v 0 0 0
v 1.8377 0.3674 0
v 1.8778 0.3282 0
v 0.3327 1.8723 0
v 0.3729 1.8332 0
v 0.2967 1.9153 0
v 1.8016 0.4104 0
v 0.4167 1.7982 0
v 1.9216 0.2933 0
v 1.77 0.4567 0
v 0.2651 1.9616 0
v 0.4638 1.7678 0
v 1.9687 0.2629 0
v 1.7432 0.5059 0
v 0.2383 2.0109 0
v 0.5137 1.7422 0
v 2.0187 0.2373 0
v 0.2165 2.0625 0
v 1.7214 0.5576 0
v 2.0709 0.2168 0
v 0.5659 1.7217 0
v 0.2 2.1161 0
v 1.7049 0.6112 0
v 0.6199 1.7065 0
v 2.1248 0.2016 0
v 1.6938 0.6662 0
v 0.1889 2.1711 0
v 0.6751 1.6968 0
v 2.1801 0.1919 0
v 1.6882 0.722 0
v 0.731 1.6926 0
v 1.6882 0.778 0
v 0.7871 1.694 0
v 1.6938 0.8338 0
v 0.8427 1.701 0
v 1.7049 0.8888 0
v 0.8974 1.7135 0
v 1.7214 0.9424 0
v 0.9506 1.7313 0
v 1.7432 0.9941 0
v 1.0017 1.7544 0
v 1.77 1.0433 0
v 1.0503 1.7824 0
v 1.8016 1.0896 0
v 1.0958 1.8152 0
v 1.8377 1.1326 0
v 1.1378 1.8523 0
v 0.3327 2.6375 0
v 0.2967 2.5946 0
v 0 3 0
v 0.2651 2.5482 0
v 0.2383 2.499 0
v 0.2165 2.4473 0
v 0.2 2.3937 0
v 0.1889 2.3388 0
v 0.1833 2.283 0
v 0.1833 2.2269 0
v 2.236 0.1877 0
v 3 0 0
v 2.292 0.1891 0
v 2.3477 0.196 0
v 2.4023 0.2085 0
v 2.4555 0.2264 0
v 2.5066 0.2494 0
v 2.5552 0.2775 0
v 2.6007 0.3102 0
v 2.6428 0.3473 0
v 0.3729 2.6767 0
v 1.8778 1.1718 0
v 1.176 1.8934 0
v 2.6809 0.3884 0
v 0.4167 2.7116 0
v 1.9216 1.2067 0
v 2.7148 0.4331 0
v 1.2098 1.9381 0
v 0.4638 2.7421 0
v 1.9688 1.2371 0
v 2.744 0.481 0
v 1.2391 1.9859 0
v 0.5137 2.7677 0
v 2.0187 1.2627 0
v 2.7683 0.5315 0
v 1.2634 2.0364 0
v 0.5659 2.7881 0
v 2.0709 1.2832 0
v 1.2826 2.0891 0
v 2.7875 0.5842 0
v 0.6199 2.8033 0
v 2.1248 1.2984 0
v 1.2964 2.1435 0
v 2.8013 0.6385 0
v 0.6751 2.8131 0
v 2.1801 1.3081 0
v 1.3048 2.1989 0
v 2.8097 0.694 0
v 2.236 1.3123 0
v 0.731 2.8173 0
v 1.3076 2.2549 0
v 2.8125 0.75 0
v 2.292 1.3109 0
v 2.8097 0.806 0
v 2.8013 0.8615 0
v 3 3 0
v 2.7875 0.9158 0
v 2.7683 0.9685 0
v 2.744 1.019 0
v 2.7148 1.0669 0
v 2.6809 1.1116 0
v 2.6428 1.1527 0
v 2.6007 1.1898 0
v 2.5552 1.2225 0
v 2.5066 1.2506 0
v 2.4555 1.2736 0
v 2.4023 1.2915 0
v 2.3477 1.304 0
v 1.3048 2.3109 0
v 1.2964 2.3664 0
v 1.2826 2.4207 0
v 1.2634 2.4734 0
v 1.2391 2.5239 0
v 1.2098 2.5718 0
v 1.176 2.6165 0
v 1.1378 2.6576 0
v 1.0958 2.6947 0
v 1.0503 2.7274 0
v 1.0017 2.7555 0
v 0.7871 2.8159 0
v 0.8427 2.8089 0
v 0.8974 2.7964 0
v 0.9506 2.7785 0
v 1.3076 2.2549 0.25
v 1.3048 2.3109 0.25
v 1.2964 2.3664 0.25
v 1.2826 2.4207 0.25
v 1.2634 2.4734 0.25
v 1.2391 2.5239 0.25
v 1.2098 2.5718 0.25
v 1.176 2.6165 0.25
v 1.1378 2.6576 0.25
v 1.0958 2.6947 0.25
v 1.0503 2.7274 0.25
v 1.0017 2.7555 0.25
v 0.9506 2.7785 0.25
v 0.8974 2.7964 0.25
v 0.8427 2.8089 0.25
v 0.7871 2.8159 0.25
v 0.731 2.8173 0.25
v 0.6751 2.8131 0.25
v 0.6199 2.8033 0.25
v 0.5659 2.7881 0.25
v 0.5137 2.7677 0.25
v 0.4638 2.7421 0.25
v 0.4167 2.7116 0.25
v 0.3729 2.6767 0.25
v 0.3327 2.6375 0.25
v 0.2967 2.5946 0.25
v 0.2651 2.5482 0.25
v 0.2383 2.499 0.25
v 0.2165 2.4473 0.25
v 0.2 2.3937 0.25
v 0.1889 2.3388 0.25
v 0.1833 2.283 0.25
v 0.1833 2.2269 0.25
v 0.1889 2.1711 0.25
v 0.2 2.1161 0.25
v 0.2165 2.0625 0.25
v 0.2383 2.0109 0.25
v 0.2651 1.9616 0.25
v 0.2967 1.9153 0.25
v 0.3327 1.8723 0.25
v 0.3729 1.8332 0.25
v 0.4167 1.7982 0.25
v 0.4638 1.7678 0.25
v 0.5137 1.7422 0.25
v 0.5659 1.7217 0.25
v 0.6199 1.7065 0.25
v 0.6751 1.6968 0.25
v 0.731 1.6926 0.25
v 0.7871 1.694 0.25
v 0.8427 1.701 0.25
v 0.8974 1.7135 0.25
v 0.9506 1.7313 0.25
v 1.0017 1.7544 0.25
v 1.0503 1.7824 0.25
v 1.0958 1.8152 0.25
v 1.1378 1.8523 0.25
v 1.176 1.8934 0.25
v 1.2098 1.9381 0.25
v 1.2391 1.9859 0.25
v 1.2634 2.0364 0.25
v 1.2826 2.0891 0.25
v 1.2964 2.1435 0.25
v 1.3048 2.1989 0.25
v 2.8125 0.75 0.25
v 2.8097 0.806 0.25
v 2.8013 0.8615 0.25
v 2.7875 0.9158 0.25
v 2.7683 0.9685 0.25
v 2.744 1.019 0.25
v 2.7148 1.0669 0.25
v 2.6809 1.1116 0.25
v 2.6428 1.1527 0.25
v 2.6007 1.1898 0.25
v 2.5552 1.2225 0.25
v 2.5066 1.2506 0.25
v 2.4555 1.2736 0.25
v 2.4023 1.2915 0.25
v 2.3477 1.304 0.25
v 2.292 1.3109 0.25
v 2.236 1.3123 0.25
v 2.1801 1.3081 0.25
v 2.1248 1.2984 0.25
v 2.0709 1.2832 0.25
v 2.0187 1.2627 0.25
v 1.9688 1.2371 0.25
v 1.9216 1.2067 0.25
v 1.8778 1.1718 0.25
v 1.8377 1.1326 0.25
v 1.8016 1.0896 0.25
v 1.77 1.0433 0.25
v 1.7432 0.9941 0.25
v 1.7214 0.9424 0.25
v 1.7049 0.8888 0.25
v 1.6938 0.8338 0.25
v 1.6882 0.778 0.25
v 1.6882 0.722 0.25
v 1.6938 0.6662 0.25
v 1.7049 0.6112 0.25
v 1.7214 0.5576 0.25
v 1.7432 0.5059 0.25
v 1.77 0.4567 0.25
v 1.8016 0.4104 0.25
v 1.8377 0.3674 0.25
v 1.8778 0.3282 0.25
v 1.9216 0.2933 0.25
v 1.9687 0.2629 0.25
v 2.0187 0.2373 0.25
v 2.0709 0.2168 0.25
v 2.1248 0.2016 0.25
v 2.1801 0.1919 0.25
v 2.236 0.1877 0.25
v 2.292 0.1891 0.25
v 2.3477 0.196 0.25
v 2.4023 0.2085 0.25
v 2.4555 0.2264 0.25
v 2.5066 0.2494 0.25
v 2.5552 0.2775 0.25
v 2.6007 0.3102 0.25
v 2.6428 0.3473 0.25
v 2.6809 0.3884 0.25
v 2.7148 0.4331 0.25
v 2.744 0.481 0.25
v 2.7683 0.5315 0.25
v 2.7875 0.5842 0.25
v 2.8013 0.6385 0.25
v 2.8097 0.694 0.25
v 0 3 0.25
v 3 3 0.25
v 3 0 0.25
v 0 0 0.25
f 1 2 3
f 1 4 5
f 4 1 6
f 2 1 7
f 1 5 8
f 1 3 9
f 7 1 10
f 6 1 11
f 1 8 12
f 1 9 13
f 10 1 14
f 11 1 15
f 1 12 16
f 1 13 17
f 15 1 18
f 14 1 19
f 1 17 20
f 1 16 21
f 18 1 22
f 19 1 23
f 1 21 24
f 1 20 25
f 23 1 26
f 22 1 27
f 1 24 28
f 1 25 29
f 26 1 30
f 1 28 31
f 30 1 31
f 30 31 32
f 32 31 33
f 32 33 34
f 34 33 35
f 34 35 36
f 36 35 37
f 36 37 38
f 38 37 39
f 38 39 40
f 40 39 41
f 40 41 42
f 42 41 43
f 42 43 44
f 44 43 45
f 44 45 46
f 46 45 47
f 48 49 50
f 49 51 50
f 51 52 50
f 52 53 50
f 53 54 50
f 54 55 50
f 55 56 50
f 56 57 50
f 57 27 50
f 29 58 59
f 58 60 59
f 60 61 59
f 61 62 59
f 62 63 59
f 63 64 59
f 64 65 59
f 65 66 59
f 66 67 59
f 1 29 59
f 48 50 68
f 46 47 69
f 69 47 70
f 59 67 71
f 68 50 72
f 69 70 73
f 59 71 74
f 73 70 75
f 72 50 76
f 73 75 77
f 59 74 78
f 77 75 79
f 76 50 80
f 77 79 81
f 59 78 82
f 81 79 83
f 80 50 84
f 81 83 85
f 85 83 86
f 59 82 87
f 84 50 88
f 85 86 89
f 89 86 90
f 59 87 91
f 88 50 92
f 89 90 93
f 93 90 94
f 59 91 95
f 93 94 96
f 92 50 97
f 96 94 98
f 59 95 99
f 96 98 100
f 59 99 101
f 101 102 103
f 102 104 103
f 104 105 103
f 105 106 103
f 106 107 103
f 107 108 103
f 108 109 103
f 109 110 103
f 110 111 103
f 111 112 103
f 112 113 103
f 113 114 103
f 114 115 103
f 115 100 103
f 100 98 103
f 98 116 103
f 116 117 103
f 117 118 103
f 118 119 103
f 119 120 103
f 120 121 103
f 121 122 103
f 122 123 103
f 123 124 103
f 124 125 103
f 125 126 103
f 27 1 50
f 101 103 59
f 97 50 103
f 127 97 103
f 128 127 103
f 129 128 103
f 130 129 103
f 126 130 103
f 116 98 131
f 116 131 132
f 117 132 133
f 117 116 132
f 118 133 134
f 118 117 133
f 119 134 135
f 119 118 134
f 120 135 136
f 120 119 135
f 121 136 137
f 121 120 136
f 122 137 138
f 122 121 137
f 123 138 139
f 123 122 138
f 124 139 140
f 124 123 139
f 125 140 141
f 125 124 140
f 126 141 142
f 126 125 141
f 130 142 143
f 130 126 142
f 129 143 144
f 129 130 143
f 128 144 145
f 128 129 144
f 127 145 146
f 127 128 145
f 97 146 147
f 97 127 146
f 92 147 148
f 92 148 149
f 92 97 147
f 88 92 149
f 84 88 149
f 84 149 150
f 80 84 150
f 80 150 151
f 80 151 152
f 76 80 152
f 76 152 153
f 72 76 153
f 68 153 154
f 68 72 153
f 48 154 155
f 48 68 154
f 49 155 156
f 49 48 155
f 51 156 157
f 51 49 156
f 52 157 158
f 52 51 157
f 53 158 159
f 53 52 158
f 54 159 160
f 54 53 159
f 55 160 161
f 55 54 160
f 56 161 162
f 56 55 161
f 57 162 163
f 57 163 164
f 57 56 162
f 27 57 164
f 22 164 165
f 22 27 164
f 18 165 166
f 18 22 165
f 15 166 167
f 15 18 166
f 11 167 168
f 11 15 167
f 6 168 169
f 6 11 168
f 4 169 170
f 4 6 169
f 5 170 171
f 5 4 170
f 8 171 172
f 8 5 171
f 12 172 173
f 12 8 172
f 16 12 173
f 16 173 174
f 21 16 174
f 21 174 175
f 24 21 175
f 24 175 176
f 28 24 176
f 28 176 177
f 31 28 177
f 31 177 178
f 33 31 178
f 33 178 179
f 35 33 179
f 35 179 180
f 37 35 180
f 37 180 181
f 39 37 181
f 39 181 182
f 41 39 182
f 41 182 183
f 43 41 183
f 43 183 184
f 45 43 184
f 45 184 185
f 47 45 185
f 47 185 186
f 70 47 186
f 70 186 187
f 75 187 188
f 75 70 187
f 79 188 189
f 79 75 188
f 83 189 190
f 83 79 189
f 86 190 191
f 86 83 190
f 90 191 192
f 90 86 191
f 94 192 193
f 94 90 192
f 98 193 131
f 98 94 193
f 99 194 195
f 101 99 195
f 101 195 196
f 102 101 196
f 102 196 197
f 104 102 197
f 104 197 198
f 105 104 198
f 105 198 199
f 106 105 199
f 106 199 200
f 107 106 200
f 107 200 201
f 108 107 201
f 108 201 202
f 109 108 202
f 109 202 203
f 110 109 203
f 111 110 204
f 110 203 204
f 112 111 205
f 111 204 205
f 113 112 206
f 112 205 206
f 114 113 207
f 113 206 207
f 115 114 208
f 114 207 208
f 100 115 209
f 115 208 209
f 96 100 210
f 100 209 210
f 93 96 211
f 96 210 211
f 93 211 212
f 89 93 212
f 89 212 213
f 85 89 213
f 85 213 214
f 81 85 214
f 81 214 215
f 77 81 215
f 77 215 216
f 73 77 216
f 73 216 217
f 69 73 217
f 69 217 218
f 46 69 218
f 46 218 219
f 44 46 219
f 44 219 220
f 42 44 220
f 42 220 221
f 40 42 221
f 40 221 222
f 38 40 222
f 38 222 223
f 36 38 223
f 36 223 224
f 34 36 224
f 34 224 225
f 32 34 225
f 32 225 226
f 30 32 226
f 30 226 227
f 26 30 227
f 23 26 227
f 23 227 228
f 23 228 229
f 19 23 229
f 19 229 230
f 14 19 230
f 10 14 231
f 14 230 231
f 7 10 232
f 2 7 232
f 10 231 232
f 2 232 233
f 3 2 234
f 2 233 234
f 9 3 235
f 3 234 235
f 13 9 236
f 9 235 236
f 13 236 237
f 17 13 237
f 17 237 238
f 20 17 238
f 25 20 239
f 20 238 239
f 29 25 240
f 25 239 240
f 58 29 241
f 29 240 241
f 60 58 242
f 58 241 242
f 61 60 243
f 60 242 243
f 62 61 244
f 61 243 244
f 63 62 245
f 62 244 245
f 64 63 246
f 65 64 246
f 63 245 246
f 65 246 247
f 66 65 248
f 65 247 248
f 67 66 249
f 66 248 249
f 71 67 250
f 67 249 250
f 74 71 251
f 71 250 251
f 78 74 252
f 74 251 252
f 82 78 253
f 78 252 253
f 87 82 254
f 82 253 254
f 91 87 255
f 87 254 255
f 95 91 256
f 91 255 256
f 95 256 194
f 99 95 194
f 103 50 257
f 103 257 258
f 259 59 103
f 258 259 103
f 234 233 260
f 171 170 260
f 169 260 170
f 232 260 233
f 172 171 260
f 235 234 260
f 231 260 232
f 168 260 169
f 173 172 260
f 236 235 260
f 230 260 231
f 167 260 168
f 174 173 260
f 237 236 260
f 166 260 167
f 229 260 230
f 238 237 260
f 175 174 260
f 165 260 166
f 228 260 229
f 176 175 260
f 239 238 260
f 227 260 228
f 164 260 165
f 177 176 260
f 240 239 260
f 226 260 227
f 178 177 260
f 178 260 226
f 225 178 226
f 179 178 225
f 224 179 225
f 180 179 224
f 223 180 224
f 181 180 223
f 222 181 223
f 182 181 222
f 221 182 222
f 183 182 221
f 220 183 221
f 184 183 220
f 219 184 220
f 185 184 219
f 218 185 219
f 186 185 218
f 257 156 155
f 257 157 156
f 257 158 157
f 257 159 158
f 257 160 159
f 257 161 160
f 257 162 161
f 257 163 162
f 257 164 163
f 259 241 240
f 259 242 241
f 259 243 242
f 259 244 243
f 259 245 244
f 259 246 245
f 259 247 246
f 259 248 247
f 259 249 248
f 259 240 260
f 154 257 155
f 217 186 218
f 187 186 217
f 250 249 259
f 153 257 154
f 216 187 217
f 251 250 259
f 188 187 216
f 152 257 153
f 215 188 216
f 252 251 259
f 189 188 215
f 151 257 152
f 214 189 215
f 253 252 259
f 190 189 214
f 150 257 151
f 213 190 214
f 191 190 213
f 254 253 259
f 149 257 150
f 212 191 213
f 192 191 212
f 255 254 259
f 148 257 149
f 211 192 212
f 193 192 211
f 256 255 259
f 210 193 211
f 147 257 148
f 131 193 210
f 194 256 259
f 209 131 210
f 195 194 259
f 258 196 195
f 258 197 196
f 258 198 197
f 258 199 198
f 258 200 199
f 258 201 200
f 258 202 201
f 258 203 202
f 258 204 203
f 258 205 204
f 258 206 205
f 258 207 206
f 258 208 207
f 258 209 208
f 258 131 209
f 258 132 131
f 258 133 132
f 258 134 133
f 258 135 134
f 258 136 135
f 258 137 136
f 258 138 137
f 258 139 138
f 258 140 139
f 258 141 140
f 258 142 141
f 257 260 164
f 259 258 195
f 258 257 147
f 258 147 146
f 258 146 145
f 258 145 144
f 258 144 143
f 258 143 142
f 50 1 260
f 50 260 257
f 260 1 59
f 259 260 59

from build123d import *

# Parameters (mm, degrees)
SKETCH2_W           = 3
SKETCH2_H           = 3
SKETCH2_R           = 0.5625
BOSS_EXTRUDE1_DEPTH = 0.25
SKETCH5_R           = 0.5625
CUT_EXTRUDE1_DEPTH  = 5.25


with BuildPart() as part:
    # Sketch2 → Boss-Extrude1 (new body)
    with BuildSketch(Plane.XY):
        with Locations((1.5, 1.5)):
            Rectangle(SKETCH2_W, SKETCH2_H)
        with Locations((0.745068251, 2.254931749)):
            Circle(SKETCH2_R, mode=Mode.SUBTRACT)
    extrude(amount=BOSS_EXTRUDE1_DEPTH)

    # Sketch5 → Cut-Extrude1 (cut, through all)
    with BuildSketch(Plane.XY.offset(0.25)):
        with Locations((2.25, 0.75)):
            Circle(SKETCH5_R)
    extrude(amount=-CUT_EXTRUDE1_DEPTH, mode=Mode.SUBTRACT)


solid = part.part
